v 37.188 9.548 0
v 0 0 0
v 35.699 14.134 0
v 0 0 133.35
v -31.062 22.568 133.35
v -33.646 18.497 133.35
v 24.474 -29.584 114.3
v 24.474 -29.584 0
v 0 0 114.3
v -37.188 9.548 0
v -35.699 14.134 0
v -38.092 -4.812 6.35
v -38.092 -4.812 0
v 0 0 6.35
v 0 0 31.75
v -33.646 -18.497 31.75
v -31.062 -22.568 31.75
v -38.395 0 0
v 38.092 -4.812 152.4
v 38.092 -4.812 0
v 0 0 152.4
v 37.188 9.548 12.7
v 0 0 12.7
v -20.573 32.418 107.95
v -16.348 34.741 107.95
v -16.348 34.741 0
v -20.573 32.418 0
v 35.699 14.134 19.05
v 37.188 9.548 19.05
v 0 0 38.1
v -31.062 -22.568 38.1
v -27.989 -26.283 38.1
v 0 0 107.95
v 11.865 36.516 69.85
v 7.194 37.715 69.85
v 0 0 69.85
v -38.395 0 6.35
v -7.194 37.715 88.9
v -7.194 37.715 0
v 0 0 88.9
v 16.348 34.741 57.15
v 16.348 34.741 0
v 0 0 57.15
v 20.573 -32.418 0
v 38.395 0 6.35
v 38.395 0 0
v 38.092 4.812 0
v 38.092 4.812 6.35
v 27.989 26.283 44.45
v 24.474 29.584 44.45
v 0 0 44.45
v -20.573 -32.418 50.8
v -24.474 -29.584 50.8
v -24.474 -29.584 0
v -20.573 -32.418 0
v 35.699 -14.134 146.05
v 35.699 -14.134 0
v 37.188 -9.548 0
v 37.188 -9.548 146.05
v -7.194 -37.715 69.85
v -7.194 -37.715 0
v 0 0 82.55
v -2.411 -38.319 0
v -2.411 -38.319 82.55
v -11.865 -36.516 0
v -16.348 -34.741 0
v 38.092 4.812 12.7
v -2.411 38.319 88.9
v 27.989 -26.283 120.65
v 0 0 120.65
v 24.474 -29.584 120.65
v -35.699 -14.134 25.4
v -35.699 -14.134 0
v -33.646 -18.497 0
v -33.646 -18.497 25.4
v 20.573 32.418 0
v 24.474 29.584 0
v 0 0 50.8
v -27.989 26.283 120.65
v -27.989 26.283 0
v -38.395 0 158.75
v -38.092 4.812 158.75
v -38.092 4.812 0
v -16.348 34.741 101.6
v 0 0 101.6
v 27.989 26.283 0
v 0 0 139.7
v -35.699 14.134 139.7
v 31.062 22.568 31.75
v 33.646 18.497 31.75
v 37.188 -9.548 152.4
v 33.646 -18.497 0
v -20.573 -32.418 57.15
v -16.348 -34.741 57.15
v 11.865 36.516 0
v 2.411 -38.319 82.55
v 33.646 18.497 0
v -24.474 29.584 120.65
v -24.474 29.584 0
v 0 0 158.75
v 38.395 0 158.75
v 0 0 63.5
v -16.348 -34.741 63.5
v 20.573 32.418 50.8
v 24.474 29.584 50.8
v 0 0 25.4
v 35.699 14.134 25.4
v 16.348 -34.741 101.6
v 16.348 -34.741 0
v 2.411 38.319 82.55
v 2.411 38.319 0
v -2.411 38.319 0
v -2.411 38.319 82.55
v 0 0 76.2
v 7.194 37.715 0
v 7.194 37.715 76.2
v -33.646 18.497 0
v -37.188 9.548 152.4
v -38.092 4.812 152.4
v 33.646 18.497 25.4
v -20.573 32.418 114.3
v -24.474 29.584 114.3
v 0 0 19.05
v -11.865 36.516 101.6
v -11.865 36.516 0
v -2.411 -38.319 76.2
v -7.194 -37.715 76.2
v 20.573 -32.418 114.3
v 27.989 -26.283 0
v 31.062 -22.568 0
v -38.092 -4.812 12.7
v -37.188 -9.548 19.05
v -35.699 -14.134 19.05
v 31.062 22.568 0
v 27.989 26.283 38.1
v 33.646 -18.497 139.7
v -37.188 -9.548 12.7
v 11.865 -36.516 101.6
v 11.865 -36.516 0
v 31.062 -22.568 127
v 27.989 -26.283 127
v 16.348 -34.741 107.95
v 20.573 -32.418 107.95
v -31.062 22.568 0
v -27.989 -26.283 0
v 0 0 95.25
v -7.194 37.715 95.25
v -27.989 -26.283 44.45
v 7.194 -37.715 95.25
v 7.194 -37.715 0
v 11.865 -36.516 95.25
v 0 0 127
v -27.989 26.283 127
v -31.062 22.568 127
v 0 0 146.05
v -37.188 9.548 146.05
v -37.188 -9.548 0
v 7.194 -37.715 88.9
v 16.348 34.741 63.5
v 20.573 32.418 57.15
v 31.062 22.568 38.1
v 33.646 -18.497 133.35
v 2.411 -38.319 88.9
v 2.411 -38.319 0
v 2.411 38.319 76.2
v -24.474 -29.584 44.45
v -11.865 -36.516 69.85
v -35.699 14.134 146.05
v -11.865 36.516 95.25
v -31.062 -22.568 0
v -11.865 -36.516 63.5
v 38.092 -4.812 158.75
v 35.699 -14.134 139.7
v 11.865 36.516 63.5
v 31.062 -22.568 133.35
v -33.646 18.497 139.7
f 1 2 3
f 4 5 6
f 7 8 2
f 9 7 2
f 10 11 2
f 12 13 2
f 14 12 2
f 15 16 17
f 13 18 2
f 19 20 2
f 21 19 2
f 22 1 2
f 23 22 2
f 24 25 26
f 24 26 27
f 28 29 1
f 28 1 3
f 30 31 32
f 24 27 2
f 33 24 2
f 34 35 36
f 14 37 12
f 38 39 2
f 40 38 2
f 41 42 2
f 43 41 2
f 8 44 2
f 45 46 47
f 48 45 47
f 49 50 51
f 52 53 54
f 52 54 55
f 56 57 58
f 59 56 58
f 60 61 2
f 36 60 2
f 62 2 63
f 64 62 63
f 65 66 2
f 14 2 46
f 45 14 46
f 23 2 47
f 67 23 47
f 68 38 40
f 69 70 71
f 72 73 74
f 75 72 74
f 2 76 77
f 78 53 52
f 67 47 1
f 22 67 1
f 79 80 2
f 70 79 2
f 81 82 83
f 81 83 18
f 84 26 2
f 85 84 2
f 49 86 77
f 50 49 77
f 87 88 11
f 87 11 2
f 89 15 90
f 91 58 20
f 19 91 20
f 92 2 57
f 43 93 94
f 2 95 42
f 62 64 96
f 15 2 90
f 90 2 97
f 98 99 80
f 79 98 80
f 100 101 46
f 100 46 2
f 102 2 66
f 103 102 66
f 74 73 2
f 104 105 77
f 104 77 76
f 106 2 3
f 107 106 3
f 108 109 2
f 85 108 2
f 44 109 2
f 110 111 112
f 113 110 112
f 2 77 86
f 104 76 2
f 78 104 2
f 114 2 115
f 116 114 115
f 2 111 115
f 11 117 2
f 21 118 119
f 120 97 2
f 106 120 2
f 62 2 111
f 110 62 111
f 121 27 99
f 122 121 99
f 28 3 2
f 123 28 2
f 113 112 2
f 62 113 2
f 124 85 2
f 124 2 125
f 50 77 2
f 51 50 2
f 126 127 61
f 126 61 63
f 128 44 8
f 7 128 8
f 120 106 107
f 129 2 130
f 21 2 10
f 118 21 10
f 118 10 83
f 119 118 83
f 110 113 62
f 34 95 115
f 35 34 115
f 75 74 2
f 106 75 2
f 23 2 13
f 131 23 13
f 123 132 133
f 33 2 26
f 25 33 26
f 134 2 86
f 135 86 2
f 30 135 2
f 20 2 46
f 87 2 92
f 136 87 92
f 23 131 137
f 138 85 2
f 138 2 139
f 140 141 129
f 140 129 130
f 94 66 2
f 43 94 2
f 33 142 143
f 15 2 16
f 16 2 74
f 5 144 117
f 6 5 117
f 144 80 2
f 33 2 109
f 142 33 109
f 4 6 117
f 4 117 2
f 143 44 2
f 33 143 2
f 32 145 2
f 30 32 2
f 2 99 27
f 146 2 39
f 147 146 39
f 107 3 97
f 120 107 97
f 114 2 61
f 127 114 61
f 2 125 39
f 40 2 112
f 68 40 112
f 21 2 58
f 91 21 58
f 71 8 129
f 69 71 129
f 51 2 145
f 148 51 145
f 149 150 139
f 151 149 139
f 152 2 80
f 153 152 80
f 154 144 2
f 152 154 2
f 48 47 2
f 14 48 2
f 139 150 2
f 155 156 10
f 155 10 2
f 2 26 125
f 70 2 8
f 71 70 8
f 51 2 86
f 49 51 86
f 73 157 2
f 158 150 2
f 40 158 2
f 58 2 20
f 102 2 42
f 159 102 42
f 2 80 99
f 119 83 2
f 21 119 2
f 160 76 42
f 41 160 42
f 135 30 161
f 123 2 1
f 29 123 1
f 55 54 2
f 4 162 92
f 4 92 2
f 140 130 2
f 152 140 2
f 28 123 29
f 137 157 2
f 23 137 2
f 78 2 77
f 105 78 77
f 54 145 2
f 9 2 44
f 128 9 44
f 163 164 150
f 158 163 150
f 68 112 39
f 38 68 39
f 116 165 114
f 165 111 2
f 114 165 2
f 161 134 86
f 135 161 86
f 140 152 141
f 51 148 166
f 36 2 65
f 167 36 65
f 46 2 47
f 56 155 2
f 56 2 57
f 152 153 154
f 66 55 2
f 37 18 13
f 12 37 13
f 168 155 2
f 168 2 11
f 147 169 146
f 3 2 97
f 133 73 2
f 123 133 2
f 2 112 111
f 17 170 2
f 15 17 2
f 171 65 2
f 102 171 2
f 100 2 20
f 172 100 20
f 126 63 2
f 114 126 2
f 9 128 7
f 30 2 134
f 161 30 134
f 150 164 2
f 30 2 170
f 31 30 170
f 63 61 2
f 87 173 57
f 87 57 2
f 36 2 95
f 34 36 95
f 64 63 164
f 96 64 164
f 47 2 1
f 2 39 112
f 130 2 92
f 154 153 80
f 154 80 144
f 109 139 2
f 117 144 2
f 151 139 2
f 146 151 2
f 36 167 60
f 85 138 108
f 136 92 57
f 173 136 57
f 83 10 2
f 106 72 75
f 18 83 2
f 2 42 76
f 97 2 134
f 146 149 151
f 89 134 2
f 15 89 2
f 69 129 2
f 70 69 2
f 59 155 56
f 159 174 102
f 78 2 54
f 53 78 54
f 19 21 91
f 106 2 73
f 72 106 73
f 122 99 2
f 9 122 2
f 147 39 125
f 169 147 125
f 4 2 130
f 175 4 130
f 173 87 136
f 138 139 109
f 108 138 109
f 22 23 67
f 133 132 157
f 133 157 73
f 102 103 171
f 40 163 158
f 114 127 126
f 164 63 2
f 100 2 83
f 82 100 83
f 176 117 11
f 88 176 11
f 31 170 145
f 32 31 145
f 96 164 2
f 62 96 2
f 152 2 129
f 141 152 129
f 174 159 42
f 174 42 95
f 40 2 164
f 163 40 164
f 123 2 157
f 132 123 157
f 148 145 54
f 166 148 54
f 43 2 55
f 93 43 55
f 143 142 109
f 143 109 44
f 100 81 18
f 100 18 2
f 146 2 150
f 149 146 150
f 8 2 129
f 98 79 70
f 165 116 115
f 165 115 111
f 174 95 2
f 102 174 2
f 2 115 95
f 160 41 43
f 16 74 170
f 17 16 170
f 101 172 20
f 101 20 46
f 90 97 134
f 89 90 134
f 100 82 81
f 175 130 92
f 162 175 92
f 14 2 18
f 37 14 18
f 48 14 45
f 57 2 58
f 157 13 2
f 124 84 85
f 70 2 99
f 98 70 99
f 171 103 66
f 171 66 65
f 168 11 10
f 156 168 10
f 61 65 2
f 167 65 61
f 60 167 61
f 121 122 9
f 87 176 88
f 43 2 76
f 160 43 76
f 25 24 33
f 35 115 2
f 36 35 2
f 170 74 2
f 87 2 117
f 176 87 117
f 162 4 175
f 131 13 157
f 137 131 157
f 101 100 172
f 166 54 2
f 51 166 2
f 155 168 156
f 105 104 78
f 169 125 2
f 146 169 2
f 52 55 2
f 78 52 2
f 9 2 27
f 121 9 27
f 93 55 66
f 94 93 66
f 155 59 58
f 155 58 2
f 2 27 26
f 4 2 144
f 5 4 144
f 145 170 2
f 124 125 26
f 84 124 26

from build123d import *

# Parameters (mm, degrees)
F1_DEPTH  = 6.35
F2_DEPTH  = 12.7
F3_DEPTH  = 19.05
F4_DEPTH  = 25.4
F5_DEPTH  = 31.75
F6_DEPTH  = 38.1
F7_DEPTH  = 44.45
F8_DEPTH  = 50.8
F9_DEPTH  = 57.15
F10_DEPTH = 63.5
F11_DEPTH = 69.85
F12_DEPTH = 76.2
F13_DEPTH = 82.55
F14_DEPTH = 88.9
F15_DEPTH = 95.25
F16_DEPTH = 101.6
F17_DEPTH = 107.95
F18_DEPTH = 114.3
F19_DEPTH = 120.65
F20_DEPTH = 127
F21_DEPTH = 133.35
F22_DEPTH = 139.7
F23_DEPTH = 146.05
F24_DEPTH = 152.4
F25_DEPTH = 158.75


with BuildPart() as f1:
    # F0 (on Top) → F1 (new body)
    with BuildSketch(Plane.XY):
        Polygon((38.091975, 4.812136), (0, 0), (38.394729, 0), align=None)
        Polygon((-38.091975, -4.812136), (0, 0), (-38.394729, 0), align=None)
    extrude(amount=F1_DEPTH)


with BuildPart() as f2:
    # F0 (on Top) → F2 (new body)
    with BuildSketch(Plane.XY):
        Polygon((37.188488, 9.548381), (0, 0), (38.091975, 4.812136), align=None)
        Polygon((-37.188488, -9.548381), (0, 0), (-38.091975, -4.812136), align=None)
    extrude(amount=F2_DEPTH)


with BuildPart() as f3:
    # F0 (on Top) → F3 (new body)
    with BuildSketch(Plane.XY):
        Polygon((35.698516, 14.134042), (0, 0), (37.188488, 9.548381), align=None)
        Polygon((-35.698516, -14.134042), (0, 0), (-37.188488, -9.548381), align=None)
    extrude(amount=F3_DEPTH)


with BuildPart() as f4:
    # F0 (on Top) → F4 (new body)
    with BuildSketch(Plane.XY):
        Polygon((33.645557, 18.496802), (0, 0), (35.698516, 14.134042), align=None)
        Polygon((-33.645557, -18.496802), (0, 0), (-35.698516, -14.134042), align=None)
    extrude(amount=F4_DEPTH)


with BuildPart() as f5:
    # F0 (on Top) → F5 (new body)
    with BuildSketch(Plane.XY):
        Polygon((31.061988, 22.567855), (0, 0), (33.645557, 18.496802), align=None)
        Polygon((-31.061988, -22.567855), (0, 0), (-33.645557, -18.496802), align=None)
    extrude(amount=F5_DEPTH)


with BuildPart() as f6:
    # F0 (on Top) → F6 (new body)
    with BuildSketch(Plane.XY):
        Polygon((27.988553, 26.283), (0, 0), (31.061988, 22.567855), align=None)
        Polygon((-27.988553, -26.283), (0, 0), (-31.061988, -22.567855), align=None)
    extrude(amount=F6_DEPTH)


with BuildPart() as f7:
    # F0 (on Top) → F7 (new body)
    with BuildSketch(Plane.XY):
        Polygon((24.473721, 29.583647), (0, 0), (27.988553, 26.283), align=None)
        Polygon((-24.473721, -29.583647), (0, 0), (-27.988553, -26.283), align=None)
    extrude(amount=F7_DEPTH)


with BuildPart() as f8:
    # F0 (on Top) → F8 (new body)
    with BuildSketch(Plane.XY):
        Polygon((20.572924, 32.417742), (0, 0), (24.473721, 29.583647), align=None)
        Polygon((-20.572924, -32.417742), (0, 0), (-24.473721, -29.583647), align=None)
    extrude(amount=F8_DEPTH)


with BuildPart() as f9:
    # F0 (on Top) → F9 (new body)
    with BuildSketch(Plane.XY):
        Polygon((16.34768, 34.740589), (0, 0), (20.572924, 32.417742), align=None)
        Polygon((-16.34768, -34.740589), (0, 0), (-20.572924, -32.417742), align=None)
    extrude(amount=F9_DEPTH)


with BuildPart() as f10:
    # F0 (on Top) → F10 (new body)
    with BuildSketch(Plane.XY):
        Polygon((11.864624, 36.515557), (0, 0), (16.34768, 34.740589), align=None)
        Polygon((-11.864624, -36.515557), (0, 0), (-16.34768, -34.740589), align=None)
    extrude(amount=F10_DEPTH)


with BuildPart() as f11:
    # F0 (on Top) → F11 (new body)
    with BuildSketch(Plane.XY):
        Polygon((7.194455, 37.714653), (0, 0), (11.864624, 36.515557), align=None)
        Polygon((-7.194455, -37.714653), (0, 0), (-11.864624, -36.515557), align=None)
    extrude(amount=F11_DEPTH)


with BuildPart() as f12:
    # F0 (on Top) → F12 (new body)
    with BuildSketch(Plane.XY):
        Polygon((7.194455, 37.714653), (2.410825, 38.318966), (0, 0), align=None)
        Polygon((-2.410825, -38.318966), (0, 0), (-7.194455, -37.714653), align=None)
    extrude(amount=F12_DEPTH)


with BuildPart() as f13:
    # F0 (on Top) → F13 (new body)
    with BuildSketch(Plane.XY):
        Polygon((2.410825, 38.318966), (-2.410825, 38.318966), (0, 0), align=None)
        Polygon((2.410825, -38.318966), (0, 0), (-2.410825, -38.318966), align=None)
    extrude(amount=F13_DEPTH)


with BuildPart() as f14:
    # F0 (on Top) → F14 (new body)
    with BuildSketch(Plane.XY):
        Polygon((0, 0), (-2.410825, 38.318966), (-7.194455, 37.714653), align=None)
        Polygon((7.194455, -37.714653), (0, 0), (2.410825, -38.318966), align=None)
    extrude(amount=F14_DEPTH)


with BuildPart() as f15:
    # F0 (on Top) → F15 (new body)
    with BuildSketch(Plane.XY):
        Polygon((0, 0), (-7.194455, 37.714653), (-11.864624, 36.515557), align=None)
        Polygon((11.864624, -36.515557), (0, 0), (7.194455, -37.714653), align=None)
    extrude(amount=F15_DEPTH)


with BuildPart() as f16:
    # F0 (on Top) → F16 (new body)
    with BuildSketch(Plane.XY):
        Polygon((-16.34768, 34.740589), (0, 0), (-11.864624, 36.515557), align=None)
        Polygon((16.34768, -34.740589), (0, 0), (11.864624, -36.515557), align=None)
    extrude(amount=F16_DEPTH)


with BuildPart() as f17:
    # F0 (on Top) → F17 (new body)
    with BuildSketch(Plane.XY):
        Polygon((-20.572924, 32.417742), (0, 0), (-16.34768, 34.740589), align=None)
        Polygon((20.572924, -32.417742), (0, 0), (16.34768, -34.740589), align=None)
    extrude(amount=F17_DEPTH)


with BuildPart() as f18:
    # F0 (on Top) → F18 (new body)
    with BuildSketch(Plane.XY):
        Polygon((-24.473721, 29.583647), (0, 0), (-20.572924, 32.417742), align=None)
        Polygon((24.473721, -29.583647), (0, 0), (20.572924, -32.417742), align=None)
    extrude(amount=F18_DEPTH)


with BuildPart() as f19:
    # F0 (on Top) → F19 (new body)
    with BuildSketch(Plane.XY):
        Polygon((-27.988553, 26.283), (0, 0), (-24.473721, 29.583647), align=None)
        Polygon((27.988553, -26.283), (0, 0), (24.473721, -29.583647), align=None)
    extrude(amount=F19_DEPTH)


with BuildPart() as f20:
    # F0 (on Top) → F20 (new body)
    with BuildSketch(Plane.XY):
        Polygon((-31.061988, 22.567855), (0, 0), (-27.988553, 26.283), align=None)
        Polygon((31.061988, -22.567855), (0, 0), (27.988553, -26.283), align=None)
    extrude(amount=F20_DEPTH)


with BuildPart() as f21:
    # F0 (on Top) → F21 (new body)
    with BuildSketch(Plane.XY):
        Polygon((-33.645557, 18.496802), (0, 0), (-31.061988, 22.567855), align=None)
        Polygon((33.645557, -18.496802), (0, 0), (31.061988, -22.567855), align=None)
    extrude(amount=F21_DEPTH)


with BuildPart() as f22:
    # F0 (on Top) → F22 (new body)
    with BuildSketch(Plane.XY):
        Polygon((-35.698516, 14.134042), (0, 0), (-33.645557, 18.496802), align=None)
        Polygon((35.698516, -14.134042), (0, 0), (33.645557, -18.496802), align=None)
    extrude(amount=F22_DEPTH)


with BuildPart() as f23:
    # F0 (on Top) → F23 (new body)
    with BuildSketch(Plane.XY):
        Polygon((-37.188488, 9.548381), (0, 0), (-35.698516, 14.134042), align=None)
        Polygon((37.188488, -9.548381), (0, 0), (35.698516, -14.134042), align=None)
    extrude(amount=F23_DEPTH)


with BuildPart() as f24:
    # F0 (on Top) → F24 (new body)
    with BuildSketch(Plane.XY):
        Polygon((-38.091975, 4.812136), (0, 0), (-37.188488, 9.548381), align=None)
        Polygon((38.091975, -4.812136), (0, 0), (37.188488, -9.548381), align=None)
    extrude(amount=F24_DEPTH)


with BuildPart() as f25:
    # F0 (on Top) → F25 (new body)
    with BuildSketch(Plane.XY):
        Polygon((-38.394729, 0), (0, 0), (-38.091975, 4.812136), align=None)
        Polygon((38.394729, 0), (0, 0), (38.091975, -4.812136), align=None)
    extrude(amount=F25_DEPTH)


solid = Compound([f1.part, f2.part, f3.part, f4.part, f5.part, f6.part, f7.part, f8.part, f9.part, f10.part, f11.part, f12.part, f13.part, f14.part, f15.part, f16.part, f17.part, f18.part, f19.part, f20.part, f21.part, f22.part, f23.part, f24.part, f25.part])
